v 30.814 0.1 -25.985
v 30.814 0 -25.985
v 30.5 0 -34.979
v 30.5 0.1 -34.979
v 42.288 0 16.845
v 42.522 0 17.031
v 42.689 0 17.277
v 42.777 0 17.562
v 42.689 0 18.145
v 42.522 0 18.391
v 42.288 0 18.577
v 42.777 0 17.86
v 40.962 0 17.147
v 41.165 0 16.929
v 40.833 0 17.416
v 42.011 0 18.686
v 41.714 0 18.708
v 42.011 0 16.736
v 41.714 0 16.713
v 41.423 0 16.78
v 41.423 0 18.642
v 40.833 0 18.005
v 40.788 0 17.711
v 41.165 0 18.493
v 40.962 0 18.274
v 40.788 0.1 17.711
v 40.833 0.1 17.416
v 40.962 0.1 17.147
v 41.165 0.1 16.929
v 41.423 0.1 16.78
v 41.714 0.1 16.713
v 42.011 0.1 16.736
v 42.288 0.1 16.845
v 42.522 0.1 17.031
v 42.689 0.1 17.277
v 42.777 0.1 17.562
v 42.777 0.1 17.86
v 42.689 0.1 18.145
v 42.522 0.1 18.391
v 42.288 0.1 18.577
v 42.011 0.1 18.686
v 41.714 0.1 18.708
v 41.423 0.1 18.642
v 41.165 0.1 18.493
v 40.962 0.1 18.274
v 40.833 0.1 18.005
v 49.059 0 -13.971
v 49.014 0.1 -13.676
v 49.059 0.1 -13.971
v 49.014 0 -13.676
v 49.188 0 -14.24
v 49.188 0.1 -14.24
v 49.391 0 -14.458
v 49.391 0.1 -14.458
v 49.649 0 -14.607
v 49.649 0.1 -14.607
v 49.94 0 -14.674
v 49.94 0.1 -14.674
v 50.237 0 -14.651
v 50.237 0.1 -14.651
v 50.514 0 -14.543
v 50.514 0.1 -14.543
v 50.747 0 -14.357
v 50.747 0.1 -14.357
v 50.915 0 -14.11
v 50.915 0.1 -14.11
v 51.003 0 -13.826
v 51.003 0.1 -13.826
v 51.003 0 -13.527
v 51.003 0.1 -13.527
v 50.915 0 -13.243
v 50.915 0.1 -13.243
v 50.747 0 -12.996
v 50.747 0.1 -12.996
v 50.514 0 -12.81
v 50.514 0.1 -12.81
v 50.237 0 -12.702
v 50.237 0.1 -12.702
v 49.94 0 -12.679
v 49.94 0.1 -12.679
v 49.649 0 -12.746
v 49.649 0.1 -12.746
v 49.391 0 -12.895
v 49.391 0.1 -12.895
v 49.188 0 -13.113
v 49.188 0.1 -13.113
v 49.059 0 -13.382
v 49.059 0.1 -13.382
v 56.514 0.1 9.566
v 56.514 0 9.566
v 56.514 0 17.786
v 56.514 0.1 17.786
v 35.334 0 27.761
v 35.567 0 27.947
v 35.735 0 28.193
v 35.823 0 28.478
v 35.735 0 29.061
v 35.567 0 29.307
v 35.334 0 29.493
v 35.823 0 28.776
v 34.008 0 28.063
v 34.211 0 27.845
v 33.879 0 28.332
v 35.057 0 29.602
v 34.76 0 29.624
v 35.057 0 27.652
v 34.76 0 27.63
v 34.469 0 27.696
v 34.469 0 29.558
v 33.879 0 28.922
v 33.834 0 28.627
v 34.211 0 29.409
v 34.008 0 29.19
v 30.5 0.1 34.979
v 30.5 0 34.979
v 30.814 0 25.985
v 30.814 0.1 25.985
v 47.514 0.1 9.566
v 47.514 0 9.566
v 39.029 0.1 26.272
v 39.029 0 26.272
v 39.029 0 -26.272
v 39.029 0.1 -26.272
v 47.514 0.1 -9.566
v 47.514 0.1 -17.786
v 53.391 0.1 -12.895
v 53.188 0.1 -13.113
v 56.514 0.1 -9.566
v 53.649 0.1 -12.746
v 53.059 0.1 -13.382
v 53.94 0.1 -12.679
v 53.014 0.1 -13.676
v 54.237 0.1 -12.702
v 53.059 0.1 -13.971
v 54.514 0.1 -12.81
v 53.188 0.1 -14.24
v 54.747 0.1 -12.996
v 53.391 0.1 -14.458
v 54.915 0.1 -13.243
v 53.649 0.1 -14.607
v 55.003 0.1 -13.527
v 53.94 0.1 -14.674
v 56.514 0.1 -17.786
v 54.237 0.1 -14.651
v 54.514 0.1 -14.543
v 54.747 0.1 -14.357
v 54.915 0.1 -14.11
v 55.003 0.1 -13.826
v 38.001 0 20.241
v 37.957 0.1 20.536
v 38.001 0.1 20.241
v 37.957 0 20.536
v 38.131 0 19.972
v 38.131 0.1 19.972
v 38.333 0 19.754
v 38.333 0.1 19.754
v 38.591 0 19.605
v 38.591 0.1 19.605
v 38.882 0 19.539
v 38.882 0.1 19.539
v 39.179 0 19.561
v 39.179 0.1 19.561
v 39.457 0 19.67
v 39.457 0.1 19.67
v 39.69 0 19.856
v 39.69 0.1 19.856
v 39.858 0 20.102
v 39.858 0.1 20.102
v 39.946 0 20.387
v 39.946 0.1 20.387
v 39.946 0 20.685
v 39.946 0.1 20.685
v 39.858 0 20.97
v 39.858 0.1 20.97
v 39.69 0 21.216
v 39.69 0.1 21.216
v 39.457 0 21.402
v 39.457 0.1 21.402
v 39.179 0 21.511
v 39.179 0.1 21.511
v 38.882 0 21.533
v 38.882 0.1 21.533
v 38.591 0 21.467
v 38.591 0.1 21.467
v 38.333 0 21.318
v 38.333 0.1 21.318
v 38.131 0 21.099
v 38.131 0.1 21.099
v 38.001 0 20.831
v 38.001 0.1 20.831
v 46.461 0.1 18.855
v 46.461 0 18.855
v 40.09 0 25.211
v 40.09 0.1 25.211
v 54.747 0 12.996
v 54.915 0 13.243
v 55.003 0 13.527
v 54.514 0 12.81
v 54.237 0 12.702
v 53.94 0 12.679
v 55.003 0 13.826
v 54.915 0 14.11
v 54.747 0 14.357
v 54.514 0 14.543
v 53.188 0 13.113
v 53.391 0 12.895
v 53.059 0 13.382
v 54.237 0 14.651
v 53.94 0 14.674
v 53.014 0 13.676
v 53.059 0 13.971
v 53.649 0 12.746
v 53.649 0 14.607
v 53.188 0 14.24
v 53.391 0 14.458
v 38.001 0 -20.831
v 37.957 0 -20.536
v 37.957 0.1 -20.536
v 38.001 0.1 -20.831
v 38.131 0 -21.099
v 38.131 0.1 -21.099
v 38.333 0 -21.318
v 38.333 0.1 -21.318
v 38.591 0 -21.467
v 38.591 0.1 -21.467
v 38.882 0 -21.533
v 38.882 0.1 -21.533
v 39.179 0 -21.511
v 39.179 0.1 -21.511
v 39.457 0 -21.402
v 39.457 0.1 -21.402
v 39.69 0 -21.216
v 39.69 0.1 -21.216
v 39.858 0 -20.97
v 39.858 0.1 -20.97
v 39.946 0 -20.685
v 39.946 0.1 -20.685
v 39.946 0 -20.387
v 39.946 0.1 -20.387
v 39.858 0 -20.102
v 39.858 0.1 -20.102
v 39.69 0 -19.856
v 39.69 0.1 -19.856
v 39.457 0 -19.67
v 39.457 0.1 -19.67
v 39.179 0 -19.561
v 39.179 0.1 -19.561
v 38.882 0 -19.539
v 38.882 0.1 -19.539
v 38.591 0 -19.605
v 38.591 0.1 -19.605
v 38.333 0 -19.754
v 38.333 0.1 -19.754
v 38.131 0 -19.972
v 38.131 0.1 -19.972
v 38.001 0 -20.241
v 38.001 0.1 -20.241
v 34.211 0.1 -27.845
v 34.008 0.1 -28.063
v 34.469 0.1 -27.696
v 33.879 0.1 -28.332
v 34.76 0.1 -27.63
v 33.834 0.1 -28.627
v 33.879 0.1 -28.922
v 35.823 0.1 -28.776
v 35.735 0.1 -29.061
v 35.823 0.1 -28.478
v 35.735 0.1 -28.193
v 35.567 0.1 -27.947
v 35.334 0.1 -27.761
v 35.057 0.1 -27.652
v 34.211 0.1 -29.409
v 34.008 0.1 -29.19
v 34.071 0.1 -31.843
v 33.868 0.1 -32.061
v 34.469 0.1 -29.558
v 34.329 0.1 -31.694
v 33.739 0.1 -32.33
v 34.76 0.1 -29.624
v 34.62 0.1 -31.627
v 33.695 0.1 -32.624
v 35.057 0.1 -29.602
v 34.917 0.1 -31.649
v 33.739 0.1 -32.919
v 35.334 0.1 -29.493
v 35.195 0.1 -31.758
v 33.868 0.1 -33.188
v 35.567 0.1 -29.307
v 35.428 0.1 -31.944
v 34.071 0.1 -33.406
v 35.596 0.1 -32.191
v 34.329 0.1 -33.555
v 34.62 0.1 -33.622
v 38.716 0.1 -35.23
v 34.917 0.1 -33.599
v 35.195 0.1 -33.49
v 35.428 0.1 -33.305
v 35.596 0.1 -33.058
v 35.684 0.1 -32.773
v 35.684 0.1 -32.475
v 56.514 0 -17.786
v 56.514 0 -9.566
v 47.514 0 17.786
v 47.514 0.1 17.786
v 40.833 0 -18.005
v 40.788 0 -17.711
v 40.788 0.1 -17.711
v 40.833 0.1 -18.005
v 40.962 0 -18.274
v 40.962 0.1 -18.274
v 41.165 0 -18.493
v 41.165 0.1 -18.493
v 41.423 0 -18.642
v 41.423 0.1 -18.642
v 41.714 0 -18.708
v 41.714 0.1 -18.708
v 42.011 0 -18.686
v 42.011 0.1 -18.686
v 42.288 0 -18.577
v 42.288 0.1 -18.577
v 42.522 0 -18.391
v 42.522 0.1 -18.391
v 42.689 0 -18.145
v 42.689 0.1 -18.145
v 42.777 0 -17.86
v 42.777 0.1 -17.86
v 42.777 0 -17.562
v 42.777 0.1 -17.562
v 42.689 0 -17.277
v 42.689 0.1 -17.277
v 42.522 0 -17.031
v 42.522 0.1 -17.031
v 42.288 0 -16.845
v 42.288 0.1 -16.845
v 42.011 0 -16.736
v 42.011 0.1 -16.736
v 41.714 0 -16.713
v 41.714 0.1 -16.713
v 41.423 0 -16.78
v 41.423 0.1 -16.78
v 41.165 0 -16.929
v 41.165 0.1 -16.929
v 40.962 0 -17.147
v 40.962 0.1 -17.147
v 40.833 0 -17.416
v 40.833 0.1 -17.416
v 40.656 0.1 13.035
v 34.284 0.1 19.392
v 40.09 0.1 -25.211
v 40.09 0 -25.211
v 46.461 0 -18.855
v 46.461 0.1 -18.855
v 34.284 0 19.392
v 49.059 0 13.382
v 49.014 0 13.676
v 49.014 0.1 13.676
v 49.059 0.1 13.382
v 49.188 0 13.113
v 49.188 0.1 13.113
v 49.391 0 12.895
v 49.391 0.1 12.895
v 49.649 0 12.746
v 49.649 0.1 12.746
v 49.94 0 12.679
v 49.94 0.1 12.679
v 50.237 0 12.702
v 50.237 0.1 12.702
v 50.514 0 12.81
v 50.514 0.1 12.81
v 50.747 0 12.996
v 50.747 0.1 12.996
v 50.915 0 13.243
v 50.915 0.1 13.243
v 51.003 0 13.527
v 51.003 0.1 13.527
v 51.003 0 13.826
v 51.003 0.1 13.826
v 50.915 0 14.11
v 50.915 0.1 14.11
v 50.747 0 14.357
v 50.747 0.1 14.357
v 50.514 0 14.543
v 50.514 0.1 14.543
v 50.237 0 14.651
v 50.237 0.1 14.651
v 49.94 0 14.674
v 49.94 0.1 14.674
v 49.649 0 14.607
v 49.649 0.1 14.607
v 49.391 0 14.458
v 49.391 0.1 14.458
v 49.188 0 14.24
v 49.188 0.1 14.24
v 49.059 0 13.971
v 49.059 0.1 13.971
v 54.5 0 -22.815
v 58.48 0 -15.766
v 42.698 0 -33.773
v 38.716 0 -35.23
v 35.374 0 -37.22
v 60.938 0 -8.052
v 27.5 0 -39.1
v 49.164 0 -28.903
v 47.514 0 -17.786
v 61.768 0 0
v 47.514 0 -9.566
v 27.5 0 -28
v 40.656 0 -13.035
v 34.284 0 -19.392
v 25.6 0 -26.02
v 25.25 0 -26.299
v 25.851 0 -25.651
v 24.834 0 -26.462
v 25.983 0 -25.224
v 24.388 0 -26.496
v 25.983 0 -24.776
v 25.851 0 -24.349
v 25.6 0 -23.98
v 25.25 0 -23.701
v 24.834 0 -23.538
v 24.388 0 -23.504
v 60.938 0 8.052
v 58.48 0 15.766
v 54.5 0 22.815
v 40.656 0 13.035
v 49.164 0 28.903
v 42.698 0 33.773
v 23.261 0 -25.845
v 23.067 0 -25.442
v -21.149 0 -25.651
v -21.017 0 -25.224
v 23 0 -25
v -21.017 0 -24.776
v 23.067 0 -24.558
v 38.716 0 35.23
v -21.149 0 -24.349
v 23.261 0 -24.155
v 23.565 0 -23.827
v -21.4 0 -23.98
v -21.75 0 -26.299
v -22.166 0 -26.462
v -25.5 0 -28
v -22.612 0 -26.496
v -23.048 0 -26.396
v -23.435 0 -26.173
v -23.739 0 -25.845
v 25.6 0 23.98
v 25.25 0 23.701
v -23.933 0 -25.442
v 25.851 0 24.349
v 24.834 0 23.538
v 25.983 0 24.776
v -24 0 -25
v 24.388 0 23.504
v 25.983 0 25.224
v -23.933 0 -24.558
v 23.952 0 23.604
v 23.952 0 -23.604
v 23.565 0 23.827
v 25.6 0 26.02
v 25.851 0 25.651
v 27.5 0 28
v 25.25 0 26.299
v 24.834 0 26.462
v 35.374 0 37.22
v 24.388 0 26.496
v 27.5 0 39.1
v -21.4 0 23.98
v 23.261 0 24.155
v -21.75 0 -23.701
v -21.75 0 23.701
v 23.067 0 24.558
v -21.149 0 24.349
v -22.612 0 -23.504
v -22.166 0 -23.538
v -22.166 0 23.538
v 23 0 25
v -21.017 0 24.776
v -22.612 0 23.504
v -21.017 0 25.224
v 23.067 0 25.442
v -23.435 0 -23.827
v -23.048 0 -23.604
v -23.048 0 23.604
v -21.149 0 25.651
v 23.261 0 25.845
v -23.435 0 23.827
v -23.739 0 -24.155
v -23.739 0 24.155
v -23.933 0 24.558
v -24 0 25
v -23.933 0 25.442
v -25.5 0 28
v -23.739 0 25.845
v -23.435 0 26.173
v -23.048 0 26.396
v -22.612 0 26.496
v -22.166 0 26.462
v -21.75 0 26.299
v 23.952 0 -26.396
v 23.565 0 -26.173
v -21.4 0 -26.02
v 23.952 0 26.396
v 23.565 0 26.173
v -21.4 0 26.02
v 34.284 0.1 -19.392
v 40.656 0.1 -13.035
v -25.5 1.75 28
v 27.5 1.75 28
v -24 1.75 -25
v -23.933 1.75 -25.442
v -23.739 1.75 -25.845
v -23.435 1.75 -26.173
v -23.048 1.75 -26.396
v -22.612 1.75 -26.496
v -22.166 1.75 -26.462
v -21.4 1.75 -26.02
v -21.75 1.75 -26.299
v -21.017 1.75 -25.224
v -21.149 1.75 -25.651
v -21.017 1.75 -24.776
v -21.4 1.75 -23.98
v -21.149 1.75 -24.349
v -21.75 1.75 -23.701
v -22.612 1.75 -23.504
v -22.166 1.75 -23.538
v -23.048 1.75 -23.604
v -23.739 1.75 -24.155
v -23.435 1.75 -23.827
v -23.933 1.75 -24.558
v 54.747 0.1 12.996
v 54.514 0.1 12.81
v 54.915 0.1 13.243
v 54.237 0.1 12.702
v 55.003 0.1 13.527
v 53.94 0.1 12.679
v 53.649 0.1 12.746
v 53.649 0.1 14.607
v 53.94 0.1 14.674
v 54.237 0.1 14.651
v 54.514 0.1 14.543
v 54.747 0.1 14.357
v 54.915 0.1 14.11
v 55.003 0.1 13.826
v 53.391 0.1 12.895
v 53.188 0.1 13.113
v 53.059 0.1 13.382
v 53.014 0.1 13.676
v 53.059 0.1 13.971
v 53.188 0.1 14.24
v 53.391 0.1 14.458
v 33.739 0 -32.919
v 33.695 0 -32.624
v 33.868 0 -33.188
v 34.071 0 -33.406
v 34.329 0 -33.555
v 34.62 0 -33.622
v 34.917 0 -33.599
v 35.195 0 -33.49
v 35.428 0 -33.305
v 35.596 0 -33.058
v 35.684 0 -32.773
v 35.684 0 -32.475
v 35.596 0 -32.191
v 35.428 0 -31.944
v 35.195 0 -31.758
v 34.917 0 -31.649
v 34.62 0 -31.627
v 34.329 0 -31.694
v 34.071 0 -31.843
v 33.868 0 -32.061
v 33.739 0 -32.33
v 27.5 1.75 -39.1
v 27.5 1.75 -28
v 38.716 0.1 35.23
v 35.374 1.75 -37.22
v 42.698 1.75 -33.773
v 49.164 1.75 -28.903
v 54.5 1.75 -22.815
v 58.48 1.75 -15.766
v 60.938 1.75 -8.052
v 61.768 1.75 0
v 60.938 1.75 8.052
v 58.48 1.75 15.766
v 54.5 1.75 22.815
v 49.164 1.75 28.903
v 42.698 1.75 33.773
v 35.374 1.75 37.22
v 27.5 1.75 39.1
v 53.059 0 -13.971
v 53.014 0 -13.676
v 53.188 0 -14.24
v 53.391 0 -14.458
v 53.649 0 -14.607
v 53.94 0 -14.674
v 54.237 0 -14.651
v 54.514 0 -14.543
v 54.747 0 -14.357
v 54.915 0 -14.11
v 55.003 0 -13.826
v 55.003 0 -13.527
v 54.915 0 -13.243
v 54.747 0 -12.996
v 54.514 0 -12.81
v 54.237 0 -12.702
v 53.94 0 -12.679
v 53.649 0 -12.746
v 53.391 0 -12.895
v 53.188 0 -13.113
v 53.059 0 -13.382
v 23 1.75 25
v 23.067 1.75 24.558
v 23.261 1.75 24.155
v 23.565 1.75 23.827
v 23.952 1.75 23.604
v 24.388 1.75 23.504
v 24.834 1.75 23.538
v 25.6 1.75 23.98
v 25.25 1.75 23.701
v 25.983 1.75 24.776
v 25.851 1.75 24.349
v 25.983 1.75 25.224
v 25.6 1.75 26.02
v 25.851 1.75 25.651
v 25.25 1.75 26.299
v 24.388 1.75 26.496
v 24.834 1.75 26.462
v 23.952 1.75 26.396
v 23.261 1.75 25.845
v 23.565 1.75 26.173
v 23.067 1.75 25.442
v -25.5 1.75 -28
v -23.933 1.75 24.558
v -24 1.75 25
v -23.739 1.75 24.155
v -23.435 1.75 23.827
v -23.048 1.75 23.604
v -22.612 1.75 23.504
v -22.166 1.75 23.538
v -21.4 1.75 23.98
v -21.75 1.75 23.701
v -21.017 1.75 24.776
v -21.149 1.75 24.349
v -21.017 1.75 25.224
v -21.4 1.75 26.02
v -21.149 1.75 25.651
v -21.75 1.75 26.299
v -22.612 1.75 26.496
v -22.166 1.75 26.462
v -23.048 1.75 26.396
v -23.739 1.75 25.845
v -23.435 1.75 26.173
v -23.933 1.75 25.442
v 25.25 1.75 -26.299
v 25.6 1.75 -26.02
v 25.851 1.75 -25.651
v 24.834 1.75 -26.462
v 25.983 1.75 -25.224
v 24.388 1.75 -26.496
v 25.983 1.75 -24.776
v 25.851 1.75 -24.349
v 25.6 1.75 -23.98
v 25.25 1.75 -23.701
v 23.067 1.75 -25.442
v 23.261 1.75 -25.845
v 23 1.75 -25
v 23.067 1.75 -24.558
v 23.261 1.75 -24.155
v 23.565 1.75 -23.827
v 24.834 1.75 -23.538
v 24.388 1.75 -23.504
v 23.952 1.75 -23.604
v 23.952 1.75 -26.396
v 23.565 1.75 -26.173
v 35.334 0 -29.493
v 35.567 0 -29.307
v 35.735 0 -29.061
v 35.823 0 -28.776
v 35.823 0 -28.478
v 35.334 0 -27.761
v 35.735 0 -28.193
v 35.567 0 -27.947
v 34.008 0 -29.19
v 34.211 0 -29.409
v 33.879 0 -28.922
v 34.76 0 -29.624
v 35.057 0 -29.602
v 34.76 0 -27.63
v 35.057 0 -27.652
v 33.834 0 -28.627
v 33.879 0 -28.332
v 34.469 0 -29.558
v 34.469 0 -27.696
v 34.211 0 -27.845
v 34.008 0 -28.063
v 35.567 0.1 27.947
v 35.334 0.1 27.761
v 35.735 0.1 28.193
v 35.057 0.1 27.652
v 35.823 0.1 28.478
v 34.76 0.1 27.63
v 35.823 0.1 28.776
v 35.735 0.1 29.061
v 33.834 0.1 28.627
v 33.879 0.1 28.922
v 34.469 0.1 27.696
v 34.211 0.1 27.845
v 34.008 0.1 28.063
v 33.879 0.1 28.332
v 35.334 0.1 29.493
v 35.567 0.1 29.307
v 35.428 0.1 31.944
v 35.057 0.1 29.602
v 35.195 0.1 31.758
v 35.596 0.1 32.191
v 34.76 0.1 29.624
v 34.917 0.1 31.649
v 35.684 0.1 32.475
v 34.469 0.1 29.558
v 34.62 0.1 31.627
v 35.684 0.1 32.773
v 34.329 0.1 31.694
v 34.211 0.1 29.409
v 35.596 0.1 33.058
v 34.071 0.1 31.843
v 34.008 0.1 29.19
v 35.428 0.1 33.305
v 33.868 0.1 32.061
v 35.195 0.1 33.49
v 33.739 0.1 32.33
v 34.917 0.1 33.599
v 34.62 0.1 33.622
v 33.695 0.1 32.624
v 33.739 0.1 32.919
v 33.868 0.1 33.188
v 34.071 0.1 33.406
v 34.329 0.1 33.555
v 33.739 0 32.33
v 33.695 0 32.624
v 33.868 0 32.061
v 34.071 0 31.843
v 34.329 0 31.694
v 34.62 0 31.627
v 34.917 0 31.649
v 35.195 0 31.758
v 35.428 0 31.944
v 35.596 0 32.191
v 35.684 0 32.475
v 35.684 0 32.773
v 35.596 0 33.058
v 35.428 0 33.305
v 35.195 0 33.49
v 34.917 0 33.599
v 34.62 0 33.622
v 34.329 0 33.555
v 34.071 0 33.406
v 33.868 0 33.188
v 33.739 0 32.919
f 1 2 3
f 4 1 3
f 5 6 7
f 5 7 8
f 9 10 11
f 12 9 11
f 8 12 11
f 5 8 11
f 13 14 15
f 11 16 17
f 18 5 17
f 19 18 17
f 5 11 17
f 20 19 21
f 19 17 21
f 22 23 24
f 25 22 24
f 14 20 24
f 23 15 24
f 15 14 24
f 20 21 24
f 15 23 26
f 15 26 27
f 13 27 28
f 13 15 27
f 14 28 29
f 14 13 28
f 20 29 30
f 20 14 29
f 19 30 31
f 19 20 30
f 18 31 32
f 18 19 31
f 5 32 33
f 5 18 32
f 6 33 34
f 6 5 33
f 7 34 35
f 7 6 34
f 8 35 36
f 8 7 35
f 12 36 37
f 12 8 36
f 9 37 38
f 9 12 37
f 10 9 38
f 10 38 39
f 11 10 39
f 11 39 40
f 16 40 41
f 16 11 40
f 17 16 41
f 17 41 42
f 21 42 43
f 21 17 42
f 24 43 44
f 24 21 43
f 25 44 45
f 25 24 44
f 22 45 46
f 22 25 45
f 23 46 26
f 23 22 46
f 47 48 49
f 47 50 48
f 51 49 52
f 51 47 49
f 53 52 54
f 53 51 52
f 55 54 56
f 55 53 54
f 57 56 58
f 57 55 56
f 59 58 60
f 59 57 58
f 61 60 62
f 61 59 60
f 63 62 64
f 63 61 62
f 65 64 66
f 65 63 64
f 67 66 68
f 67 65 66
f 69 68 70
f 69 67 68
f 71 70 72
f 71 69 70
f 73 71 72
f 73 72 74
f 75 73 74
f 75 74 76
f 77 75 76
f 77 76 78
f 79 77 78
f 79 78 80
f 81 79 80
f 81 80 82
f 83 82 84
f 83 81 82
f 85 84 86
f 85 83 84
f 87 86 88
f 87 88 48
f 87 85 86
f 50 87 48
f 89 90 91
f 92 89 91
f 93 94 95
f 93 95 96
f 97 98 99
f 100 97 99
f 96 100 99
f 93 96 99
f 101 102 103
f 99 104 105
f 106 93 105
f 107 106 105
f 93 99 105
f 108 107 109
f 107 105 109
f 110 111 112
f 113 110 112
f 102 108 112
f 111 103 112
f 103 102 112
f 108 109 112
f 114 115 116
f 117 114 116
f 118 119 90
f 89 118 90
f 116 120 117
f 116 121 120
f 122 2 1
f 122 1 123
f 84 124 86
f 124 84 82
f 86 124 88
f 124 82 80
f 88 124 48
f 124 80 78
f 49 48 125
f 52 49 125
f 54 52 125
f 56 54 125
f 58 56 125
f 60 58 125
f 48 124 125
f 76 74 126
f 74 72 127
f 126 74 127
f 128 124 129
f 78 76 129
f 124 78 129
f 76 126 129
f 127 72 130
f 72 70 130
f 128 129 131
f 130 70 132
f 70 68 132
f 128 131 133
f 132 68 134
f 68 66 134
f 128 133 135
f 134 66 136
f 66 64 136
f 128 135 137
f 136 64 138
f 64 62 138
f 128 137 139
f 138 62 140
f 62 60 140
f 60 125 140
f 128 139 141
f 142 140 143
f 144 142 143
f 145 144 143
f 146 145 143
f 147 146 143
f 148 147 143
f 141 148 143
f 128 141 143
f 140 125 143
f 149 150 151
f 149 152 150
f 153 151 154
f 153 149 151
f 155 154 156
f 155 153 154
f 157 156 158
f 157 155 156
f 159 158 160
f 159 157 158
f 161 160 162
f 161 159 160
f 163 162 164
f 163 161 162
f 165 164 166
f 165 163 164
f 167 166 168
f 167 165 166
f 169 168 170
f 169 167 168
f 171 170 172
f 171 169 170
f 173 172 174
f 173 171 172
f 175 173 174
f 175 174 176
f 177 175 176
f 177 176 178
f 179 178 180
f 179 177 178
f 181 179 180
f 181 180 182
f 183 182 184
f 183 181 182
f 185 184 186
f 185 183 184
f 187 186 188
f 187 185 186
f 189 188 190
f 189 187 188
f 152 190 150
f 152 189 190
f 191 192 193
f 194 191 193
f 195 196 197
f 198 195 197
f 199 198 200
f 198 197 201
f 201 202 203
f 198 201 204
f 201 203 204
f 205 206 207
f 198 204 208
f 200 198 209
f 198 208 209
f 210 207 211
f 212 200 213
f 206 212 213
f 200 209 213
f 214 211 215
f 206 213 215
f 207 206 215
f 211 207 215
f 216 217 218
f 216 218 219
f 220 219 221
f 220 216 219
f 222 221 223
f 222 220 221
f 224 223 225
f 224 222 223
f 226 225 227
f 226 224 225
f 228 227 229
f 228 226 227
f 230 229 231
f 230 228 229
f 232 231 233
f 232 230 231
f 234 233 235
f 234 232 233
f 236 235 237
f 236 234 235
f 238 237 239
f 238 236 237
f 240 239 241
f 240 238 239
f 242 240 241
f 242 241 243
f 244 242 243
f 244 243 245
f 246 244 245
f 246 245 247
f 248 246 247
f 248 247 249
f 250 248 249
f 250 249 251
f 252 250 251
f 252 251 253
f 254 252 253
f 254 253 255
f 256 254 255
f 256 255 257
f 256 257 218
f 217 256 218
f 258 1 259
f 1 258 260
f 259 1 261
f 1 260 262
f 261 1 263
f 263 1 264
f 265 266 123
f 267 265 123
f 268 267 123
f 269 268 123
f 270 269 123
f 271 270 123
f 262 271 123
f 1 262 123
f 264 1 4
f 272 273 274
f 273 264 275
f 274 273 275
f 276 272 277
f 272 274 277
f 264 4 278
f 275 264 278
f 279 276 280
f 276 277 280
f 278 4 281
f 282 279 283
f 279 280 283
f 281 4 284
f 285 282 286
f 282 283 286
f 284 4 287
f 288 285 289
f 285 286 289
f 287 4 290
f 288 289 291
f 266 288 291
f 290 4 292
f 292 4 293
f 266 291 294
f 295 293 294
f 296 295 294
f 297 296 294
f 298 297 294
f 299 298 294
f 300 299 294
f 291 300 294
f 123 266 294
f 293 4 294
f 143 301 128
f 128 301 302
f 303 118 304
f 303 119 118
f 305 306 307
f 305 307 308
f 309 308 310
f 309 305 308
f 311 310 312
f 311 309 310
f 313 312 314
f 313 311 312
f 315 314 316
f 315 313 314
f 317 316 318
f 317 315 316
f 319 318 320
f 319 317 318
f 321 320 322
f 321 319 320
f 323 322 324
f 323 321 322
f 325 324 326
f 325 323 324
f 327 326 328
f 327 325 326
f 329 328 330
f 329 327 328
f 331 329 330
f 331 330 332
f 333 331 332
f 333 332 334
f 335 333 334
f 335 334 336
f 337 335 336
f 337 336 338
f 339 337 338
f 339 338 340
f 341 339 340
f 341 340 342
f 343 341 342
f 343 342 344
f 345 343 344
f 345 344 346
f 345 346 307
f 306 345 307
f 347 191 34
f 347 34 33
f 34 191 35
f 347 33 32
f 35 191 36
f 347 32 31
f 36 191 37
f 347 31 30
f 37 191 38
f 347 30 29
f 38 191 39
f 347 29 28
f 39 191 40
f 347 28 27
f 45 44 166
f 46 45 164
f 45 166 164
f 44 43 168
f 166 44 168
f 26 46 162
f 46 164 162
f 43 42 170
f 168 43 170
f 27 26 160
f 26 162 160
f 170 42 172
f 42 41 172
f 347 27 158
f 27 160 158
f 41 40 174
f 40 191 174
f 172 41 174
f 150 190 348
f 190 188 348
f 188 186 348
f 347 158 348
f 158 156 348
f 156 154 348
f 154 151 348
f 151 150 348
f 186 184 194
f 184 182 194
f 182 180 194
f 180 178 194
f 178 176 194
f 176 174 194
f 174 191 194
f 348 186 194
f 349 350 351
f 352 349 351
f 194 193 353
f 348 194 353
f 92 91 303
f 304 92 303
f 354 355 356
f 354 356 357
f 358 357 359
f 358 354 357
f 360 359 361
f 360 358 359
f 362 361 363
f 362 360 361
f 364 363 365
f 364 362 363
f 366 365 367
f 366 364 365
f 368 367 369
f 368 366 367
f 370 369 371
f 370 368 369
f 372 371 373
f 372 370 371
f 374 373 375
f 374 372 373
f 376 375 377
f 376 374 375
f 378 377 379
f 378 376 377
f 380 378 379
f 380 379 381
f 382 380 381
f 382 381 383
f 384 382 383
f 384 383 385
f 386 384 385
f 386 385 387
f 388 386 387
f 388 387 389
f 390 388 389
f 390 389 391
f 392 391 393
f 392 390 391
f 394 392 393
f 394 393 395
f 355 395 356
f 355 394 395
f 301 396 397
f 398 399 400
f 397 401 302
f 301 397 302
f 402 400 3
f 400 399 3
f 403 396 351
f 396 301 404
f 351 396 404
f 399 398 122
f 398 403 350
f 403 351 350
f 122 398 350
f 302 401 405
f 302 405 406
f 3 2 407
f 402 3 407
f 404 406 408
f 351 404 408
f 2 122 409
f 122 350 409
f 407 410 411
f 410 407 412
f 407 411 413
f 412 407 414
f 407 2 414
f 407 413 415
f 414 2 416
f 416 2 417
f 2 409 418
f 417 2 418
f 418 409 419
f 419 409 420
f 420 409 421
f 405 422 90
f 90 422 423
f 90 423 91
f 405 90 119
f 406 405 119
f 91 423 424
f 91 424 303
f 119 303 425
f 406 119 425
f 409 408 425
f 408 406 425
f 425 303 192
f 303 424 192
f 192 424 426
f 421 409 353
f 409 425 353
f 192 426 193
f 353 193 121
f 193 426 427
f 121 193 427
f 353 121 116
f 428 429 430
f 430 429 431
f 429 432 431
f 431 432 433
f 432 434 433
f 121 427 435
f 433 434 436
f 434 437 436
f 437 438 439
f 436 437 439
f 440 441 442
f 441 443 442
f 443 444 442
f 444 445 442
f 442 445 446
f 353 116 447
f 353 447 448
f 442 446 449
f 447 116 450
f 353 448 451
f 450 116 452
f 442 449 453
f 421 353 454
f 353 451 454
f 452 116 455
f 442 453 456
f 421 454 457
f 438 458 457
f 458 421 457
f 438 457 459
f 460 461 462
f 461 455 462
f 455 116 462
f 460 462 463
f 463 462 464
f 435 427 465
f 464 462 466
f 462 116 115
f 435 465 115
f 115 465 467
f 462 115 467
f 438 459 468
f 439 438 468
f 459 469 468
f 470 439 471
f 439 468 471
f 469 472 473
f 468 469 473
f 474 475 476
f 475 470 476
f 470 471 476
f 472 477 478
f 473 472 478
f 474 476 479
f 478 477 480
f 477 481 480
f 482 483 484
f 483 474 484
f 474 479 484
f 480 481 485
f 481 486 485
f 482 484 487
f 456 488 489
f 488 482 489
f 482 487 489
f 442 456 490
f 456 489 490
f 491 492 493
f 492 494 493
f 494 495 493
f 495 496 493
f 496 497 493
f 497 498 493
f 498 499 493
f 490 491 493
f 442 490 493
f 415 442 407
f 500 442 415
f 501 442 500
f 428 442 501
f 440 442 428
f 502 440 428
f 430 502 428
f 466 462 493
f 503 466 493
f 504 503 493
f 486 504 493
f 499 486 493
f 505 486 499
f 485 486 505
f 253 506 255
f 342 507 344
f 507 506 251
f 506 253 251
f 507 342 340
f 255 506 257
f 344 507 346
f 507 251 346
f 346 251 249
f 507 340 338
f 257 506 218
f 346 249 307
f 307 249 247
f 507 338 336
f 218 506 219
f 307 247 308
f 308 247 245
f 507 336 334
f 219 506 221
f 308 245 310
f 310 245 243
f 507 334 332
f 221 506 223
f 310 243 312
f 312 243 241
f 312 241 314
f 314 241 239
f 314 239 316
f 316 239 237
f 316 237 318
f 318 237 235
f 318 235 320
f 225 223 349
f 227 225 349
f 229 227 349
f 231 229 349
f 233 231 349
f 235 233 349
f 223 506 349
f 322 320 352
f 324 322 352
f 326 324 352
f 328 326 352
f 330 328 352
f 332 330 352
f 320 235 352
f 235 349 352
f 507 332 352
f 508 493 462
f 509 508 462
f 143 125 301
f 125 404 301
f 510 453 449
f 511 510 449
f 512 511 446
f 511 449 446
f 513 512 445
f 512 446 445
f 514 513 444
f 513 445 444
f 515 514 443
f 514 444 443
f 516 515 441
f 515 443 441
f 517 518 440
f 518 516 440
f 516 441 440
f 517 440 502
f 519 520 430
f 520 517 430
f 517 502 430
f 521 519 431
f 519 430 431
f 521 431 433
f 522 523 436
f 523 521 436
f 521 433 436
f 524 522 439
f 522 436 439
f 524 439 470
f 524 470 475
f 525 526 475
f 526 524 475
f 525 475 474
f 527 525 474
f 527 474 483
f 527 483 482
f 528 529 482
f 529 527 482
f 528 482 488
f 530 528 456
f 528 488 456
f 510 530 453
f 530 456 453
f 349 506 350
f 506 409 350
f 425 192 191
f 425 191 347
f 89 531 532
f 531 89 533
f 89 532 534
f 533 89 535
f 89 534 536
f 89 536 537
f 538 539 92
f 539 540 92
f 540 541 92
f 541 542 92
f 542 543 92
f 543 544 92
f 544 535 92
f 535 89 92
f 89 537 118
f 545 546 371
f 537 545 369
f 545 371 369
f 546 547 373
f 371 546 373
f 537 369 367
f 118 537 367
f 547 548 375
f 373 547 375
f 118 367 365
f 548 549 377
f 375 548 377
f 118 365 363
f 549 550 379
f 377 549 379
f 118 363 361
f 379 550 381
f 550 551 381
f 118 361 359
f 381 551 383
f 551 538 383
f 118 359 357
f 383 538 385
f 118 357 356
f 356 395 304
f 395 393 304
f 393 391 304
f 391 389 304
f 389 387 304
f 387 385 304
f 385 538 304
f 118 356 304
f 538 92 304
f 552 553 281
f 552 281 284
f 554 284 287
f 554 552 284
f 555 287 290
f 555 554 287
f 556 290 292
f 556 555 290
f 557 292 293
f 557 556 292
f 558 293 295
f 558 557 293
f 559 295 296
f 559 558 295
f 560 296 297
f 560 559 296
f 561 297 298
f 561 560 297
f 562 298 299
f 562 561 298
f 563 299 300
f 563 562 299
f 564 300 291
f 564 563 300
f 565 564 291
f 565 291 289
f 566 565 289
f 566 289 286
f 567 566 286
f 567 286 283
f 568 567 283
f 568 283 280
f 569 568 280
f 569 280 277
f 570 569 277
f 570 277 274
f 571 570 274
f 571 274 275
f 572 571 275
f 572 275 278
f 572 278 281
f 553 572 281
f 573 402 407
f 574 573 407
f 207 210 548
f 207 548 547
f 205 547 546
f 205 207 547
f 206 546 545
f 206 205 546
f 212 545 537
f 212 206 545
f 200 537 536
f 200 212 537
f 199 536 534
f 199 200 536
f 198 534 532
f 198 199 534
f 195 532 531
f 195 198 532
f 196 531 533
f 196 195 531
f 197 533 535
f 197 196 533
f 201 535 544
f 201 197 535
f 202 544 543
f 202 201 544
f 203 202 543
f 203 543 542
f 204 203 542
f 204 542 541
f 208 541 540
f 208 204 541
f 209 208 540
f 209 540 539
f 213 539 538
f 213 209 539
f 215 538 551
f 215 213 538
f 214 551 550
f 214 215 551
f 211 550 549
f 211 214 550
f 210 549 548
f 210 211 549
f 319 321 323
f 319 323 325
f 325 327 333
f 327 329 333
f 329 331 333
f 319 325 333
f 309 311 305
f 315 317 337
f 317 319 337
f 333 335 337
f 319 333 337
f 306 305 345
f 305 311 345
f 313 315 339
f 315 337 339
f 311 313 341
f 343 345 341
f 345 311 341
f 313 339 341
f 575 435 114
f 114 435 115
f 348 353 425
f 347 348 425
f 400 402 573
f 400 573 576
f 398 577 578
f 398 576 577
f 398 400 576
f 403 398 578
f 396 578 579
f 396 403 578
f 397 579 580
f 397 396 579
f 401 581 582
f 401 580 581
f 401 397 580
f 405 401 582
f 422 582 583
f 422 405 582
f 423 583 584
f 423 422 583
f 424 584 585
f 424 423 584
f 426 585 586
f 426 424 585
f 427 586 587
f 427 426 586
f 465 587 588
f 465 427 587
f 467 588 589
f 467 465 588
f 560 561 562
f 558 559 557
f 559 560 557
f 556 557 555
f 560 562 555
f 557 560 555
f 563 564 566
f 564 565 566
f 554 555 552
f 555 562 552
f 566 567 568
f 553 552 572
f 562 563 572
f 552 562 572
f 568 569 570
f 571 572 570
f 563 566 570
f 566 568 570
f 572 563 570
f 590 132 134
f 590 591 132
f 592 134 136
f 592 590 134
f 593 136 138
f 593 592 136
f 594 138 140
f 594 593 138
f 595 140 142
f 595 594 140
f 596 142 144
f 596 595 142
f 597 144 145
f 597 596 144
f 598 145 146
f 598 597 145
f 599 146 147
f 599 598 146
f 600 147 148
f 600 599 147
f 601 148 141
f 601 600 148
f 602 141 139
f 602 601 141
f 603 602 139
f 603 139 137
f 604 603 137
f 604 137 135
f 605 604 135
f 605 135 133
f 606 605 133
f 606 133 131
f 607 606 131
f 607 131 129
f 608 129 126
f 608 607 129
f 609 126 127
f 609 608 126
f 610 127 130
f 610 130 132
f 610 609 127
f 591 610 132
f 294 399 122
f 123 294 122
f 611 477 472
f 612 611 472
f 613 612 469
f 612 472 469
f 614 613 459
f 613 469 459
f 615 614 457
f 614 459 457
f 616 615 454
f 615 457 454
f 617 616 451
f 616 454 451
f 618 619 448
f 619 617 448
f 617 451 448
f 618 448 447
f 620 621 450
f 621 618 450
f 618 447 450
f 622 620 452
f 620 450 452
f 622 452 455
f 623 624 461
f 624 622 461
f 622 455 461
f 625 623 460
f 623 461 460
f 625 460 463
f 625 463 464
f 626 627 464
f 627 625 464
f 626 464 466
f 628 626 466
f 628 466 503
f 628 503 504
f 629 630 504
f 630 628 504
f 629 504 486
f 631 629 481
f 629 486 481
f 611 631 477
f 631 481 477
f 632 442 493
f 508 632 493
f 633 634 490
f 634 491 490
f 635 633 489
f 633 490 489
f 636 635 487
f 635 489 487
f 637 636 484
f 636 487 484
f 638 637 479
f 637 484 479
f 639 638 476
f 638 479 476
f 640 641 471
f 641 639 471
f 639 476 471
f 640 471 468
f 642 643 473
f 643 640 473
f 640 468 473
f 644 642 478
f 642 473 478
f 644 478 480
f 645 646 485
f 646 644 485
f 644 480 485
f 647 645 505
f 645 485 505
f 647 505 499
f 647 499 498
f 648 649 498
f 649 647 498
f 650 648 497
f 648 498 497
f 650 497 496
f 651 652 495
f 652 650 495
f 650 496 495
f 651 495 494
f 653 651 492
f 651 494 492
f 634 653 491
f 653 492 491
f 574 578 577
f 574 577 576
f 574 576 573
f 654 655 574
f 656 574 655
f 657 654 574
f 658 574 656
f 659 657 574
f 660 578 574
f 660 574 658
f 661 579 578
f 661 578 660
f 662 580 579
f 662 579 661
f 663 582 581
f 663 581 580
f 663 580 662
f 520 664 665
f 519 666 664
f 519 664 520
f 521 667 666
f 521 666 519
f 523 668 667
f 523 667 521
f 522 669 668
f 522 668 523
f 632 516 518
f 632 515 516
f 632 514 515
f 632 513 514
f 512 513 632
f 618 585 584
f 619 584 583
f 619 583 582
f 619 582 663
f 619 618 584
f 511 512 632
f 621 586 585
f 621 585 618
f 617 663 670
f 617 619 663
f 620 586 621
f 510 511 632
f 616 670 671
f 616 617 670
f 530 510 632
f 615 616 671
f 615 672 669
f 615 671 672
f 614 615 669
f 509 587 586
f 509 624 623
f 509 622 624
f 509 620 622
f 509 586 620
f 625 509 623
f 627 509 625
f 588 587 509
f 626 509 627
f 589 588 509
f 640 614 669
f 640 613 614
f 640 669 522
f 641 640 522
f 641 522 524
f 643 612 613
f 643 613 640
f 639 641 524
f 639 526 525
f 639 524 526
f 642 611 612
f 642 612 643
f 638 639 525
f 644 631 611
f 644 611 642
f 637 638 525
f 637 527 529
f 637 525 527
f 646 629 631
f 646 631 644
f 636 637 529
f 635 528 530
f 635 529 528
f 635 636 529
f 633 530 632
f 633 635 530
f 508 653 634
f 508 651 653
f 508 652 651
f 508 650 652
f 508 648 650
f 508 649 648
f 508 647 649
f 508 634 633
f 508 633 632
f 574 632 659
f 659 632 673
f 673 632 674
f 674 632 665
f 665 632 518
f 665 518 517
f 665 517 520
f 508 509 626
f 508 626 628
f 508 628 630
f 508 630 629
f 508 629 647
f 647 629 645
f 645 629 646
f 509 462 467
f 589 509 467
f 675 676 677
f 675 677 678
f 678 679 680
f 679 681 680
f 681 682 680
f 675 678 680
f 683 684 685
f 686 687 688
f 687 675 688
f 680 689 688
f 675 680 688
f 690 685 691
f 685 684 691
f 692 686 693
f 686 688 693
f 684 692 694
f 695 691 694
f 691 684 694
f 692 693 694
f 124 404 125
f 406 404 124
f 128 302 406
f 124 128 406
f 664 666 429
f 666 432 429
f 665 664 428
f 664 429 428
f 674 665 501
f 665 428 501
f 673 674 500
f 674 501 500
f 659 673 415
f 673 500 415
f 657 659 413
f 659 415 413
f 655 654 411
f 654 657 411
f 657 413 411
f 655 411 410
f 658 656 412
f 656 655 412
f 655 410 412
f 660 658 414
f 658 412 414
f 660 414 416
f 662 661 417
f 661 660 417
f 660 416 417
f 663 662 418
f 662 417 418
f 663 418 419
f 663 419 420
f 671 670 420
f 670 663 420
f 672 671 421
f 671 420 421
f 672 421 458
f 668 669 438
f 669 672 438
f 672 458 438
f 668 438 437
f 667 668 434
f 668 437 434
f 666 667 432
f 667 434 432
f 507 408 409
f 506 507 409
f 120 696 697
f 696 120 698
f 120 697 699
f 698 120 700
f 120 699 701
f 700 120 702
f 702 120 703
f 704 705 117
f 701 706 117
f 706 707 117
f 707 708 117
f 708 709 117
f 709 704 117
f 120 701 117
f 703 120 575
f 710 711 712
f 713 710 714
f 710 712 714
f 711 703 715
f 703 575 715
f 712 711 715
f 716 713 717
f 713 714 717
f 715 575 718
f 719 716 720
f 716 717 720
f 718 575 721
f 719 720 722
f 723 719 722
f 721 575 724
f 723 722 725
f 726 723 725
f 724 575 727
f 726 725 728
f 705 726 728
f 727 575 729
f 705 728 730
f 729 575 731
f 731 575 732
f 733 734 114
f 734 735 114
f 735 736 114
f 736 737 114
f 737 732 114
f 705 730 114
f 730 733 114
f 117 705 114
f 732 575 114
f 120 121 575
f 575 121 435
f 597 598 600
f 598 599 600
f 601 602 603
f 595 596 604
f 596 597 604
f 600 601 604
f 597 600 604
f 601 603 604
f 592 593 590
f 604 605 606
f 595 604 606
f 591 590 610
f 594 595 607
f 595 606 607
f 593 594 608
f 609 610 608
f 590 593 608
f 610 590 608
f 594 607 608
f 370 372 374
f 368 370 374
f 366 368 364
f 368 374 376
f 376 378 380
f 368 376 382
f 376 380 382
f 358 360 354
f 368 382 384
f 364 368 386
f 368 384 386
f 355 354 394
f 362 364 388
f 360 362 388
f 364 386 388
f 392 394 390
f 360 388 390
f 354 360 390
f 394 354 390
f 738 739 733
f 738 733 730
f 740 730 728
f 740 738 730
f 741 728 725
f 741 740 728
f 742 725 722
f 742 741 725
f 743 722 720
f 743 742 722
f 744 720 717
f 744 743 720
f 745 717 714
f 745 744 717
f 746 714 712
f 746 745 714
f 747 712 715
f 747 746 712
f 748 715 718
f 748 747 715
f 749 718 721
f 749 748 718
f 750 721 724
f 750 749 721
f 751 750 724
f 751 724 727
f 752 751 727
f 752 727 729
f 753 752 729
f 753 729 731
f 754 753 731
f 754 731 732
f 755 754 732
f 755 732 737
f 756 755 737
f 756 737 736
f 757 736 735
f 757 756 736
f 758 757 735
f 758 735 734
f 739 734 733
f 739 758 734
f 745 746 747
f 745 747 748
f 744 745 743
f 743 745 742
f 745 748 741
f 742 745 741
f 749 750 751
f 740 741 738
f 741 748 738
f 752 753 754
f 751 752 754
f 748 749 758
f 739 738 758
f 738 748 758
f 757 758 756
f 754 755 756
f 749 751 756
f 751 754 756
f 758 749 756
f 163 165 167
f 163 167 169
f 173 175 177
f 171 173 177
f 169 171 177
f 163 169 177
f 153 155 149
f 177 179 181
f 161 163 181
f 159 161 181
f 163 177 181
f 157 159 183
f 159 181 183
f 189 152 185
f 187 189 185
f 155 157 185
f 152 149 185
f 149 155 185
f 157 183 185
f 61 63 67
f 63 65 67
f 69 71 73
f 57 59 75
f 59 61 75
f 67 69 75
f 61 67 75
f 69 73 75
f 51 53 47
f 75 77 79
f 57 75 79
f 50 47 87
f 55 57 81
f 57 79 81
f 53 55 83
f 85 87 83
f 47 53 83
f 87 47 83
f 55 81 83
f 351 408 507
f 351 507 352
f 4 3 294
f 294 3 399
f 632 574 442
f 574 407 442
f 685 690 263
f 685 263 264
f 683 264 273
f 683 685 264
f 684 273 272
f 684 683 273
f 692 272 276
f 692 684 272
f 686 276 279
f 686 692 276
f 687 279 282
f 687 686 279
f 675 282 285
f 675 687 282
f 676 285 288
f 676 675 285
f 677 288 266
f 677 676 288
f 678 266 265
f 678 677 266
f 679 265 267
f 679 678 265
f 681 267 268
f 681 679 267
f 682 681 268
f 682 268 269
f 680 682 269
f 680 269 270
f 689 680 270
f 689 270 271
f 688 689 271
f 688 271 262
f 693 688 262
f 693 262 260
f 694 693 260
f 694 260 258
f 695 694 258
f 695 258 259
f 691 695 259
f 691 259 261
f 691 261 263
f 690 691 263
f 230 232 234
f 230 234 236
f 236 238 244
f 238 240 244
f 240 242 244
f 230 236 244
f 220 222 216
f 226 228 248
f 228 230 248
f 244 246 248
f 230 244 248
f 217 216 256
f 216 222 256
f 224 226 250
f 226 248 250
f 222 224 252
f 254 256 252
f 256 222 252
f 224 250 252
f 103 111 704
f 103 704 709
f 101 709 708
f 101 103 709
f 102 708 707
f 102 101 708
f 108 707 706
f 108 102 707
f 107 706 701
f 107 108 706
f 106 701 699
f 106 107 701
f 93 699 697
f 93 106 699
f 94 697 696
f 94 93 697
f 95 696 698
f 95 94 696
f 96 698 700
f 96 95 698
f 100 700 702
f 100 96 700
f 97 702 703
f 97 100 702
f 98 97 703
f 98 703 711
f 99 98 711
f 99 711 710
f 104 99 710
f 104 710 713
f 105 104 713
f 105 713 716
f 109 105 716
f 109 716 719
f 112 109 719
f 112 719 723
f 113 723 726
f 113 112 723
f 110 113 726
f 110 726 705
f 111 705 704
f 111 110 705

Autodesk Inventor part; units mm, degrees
ref_plane "YZ Plane" through (0, 0, 0) normal (1, 0, 0) x (0, 1, 0)
ref_plane "XZ Plane" through (0, 0, 0) normal (0, 1, 0) x (-1, 0, 0)
ref_plane "XY Plane" through (0, 0, 0) normal (0, 0, 1) x (1, 0, 0)
sketch "Sketch1" plane through (0, 0, 0) normal (0, 1, 0) x (-1, 0, 0)
  circle A0 centre (-24.5, -25) radius 1.5
  circle A1 centre (-24.5, 25) radius 1.5
  circle A2 centre (22.5, 25) radius 1.5
  circle A3 centre (22.5, -25) radius 1.5
  line L0 (-27.5, -28) -> (-8, -28)
  line L1 (-8, -28) -> (-8, -25) construction
  line L2 (6, -25) -> (6, -28) construction
  line L3 (6, -28) -> (25.5, -28)
  line L4 (25.5, -28) -> (25.5, 28)
  line L5 (25.5, 28) -> (6, 28)
  line L6 (-8, 28) -> (-27.5, 28)
  line L7 (-27.5, 28) -> (-27.5, 39.1)
  arc A4 (-27.5, 39.1) -> (-27.5, -39.1) centre (-22.3277, 0) ccw
  line L8 (-27.5, -39.1) -> (-27.5, -28)
  line L9 (-8, 28) -> (6, 28)
  line L10 (-8, -25) -> (-8, 28) construction
  line L11 (6, -25) -> (6, 28) construction
  line L12 (-8, -28) -> (6, -28)
  line L13 (22.75, 28) -> (-24.75, 28) construction
  line L14 (-24.75, 22) -> (22.75, 22) construction
  line L15 (25.5, -22) -> (-24.75, -22) construction
  line L16 (-24.75, -28) -> (22.75, -28) construction
  line L17 (-8, 28) -> (-27.5, 28) construction
  line L18 (-27.5, 28) -> (-27.5, 39.1) construction
  arc A5 (-27.5, 39.1) -> (-27.5, -39.1) centre (-22.3277, 0) ccw construction
  circle A6 centre (-38.9568, 20.5358) radius 1
  line L19 (-40.0897, 25.2111) -> (-34.2841, 19.3919)
  line L20 (-46.4612, 18.8546) -> (-40.0897, 25.2111)
  circle A7 centre (-41.7885, 17.7107) radius 1
  line L21 (-46.4612, 18.8546) -> (-40.6556, 13.0354)
  line L22 (-34.2841, 19.3919) -> (-40.6556, 13.0354)
  line L23 (-39.9854, 35.3107) -> (-39.9038, 35.3078) construction
  circle A8 centre (-34.6947, 32.6244) radius 1
  line L24 (-39.0291, 26.2718) -> (-38.7163, 35.2301)
  circle A9 centre (-34.8343, 28.6268) radius 1
  line L25 (-39.0291, 26.2718) -> (-30.8141, 25.9849)
  line L26 (-30.5, 34.9794) -> (-30.8141, 25.9849)
  circle A10 centre (-50.0144, 13.6765) radius 1
  line L27 (-47.5144, 9.5665) -> (-47.5144, 17.7865)
  circle A11 centre (-54.0144, 13.6765) radius 1
  line L28 (-56.5144, 17.7865) -> (-47.5144, 17.7865)
  line L29 (-56.5144, 9.5665) -> (-56.5144, 17.7865)
  line L30 (-47.5144, 9.5665) -> (-56.5144, 9.5665)
  line L31 (-39.0291, 26.2718) -> (-67.0612, -1.7603) construction
  line L32 (-39.0291, 26.2718) -> (0.6143, 26.2718) construction
  line L33 (-38.7163, 35.2301) -> (-30.5, 34.9794)
  line L34 (-27.5, -28) -> (-27.5, -22) construction
  line L35 (-27.5, -22) -> (-24.75, -22) construction
  line L36 (-27.5, 28) -> (-27.5, 22) construction
  line L37 (-24.75, 22) -> (-27.5, 22) construction
  line L38 (-27.5, 22) -> (-27.5, 28) construction
  line L39 (-27.5, -22) -> (-27.5, -28) construction
  point P0 (0, 0)
  point P1 (0, 0)
  point P2 (-1, 28)
  point P3 (-1, -22)
  point P4 (-1, -28)
  point P5 (0, 0)
  point P6 (4.5, 0)
  dimension "d0" = 47.5
  dimension "d1" = 6
  dimension "d3" = 47.5
  dimension "d4" = 6
  dimension "d8" = 39.4406
  dimension "d9" = 5.1723
  dimension "d10" = 3
  dimension "d11" = 3
  dimension "d12" = 3
  dimension "d13" = 3
  dimension "d14" = 2
  dimension "d15" = 2
  dimension "d16" = 135
  dimension "d17" = 178
  dimension "d18" = 180
  dimension "d19" = 1.5
  dimension "d20" = 1.5
  dimension "d21" = 1.7282
  dimension "d22" = 8.22
  dimension "d23" = 9
  dimension "d24" = 2
  dimension "d25" = 2
  dimension "d26" = 2.5
  dimension "d27" = 4.11
  dimension "d28" = 4.11
  dimension "d29" = 2.5
  dimension "d30" = 8.22
  dimension "d31" = 2.5
  dimension "d32" = 9
  dimension "d33" = 2.5
  dimension "d34" = 4.11
  dimension "d35" = 4.11
  dimension "d36" = 9
  dimension "d37" = 8.22
  dimension "d38" = 4.11
  dimension "d39" = 2.5
  dimension "d40" = 2.5
  dimension "d41" = 4.11
  dimension "d42" = 3
  dimension "d58" = 3
  dimension "d59" = 53
  dimension "d60" = 3
  dimension "d61" = 3
  dimension "d62" = 3
extrude "Extrusion1" add sketch "Sketch1" along normal blind 1.75 contours L8 A4 L7 L6 L9 L5 L4 L3 L12 L0 | A6 | L19 L22 L21 L20 | A7 | A8 | L24 L33 L26 L25 | A9 | A10 | L30 L29 L28 L27 | A11
sketch "Sketch2" plane through (0, 0, 0) normal (0, -1, 0) x (1, 0, 0)
  circle A0 centre (-17.5, -25) radius 1.5
  circle A1 centre (-17.5, 25) radius 1.5
  circle A2 centre (19.5, 25) radius 1.5
  circle A3 centre (19.5, -25) radius 1.5
  line L0 (27.5, -28) -> (-25.5, -28) projected
  line L1 (27.5, -39.1) -> (27.5, -28) projected
  arc A4 (27.5, 39.1) -> (27.5, -39.1) centre (22.3277, 0) ccw projected
  line L2 (27.5, 28) -> (27.5, 39.1) projected
  line L3 (-25.5, 28) -> (27.5, 28) projected
  line L4 (-25.5, -28) -> (-25.5, 28) projected
  line L5 (24.75, 28) -> (-22.75, 28)
  line L6 (-22.75, 28) -> (-22.75, 22)
  line L7 (-22.75, 22) -> (24.75, 22)
  line L8 (24.75, 22) -> (24.75, 28)
  line L9 (24.75, -22) -> (-22.75, -22)
  line L10 (-22.75, -22) -> (-22.75, -28)
  line L11 (-22.75, -28) -> (24.75, -28)
  line L12 (24.75, -28) -> (24.75, -22)
  point P0 (0, 0)
  point P1 (1, 28)
  point P2 (1, -28)
  dimension "d45" = 47.5
  dimension "d46" = 6
  dimension "d48" = 5.25
  dimension "d49" = 5.25
  dimension "d50" = 47.5
  dimension "d51" = 6
  dimension "d52" = 5.25
  dimension "d53" = 5.25
extrude "Extrusion2" cut sketch "Sketch1" along normal blind 0.1 contours L19 L22 L21 L20 | L24 L33 L26 L25 | L30 L29 L28 L27
mirror "Mirror1" about plane through (0, 0, 0) normal (0, 0, 1) of "Extrusion2"
properties part number "PCB_final"
